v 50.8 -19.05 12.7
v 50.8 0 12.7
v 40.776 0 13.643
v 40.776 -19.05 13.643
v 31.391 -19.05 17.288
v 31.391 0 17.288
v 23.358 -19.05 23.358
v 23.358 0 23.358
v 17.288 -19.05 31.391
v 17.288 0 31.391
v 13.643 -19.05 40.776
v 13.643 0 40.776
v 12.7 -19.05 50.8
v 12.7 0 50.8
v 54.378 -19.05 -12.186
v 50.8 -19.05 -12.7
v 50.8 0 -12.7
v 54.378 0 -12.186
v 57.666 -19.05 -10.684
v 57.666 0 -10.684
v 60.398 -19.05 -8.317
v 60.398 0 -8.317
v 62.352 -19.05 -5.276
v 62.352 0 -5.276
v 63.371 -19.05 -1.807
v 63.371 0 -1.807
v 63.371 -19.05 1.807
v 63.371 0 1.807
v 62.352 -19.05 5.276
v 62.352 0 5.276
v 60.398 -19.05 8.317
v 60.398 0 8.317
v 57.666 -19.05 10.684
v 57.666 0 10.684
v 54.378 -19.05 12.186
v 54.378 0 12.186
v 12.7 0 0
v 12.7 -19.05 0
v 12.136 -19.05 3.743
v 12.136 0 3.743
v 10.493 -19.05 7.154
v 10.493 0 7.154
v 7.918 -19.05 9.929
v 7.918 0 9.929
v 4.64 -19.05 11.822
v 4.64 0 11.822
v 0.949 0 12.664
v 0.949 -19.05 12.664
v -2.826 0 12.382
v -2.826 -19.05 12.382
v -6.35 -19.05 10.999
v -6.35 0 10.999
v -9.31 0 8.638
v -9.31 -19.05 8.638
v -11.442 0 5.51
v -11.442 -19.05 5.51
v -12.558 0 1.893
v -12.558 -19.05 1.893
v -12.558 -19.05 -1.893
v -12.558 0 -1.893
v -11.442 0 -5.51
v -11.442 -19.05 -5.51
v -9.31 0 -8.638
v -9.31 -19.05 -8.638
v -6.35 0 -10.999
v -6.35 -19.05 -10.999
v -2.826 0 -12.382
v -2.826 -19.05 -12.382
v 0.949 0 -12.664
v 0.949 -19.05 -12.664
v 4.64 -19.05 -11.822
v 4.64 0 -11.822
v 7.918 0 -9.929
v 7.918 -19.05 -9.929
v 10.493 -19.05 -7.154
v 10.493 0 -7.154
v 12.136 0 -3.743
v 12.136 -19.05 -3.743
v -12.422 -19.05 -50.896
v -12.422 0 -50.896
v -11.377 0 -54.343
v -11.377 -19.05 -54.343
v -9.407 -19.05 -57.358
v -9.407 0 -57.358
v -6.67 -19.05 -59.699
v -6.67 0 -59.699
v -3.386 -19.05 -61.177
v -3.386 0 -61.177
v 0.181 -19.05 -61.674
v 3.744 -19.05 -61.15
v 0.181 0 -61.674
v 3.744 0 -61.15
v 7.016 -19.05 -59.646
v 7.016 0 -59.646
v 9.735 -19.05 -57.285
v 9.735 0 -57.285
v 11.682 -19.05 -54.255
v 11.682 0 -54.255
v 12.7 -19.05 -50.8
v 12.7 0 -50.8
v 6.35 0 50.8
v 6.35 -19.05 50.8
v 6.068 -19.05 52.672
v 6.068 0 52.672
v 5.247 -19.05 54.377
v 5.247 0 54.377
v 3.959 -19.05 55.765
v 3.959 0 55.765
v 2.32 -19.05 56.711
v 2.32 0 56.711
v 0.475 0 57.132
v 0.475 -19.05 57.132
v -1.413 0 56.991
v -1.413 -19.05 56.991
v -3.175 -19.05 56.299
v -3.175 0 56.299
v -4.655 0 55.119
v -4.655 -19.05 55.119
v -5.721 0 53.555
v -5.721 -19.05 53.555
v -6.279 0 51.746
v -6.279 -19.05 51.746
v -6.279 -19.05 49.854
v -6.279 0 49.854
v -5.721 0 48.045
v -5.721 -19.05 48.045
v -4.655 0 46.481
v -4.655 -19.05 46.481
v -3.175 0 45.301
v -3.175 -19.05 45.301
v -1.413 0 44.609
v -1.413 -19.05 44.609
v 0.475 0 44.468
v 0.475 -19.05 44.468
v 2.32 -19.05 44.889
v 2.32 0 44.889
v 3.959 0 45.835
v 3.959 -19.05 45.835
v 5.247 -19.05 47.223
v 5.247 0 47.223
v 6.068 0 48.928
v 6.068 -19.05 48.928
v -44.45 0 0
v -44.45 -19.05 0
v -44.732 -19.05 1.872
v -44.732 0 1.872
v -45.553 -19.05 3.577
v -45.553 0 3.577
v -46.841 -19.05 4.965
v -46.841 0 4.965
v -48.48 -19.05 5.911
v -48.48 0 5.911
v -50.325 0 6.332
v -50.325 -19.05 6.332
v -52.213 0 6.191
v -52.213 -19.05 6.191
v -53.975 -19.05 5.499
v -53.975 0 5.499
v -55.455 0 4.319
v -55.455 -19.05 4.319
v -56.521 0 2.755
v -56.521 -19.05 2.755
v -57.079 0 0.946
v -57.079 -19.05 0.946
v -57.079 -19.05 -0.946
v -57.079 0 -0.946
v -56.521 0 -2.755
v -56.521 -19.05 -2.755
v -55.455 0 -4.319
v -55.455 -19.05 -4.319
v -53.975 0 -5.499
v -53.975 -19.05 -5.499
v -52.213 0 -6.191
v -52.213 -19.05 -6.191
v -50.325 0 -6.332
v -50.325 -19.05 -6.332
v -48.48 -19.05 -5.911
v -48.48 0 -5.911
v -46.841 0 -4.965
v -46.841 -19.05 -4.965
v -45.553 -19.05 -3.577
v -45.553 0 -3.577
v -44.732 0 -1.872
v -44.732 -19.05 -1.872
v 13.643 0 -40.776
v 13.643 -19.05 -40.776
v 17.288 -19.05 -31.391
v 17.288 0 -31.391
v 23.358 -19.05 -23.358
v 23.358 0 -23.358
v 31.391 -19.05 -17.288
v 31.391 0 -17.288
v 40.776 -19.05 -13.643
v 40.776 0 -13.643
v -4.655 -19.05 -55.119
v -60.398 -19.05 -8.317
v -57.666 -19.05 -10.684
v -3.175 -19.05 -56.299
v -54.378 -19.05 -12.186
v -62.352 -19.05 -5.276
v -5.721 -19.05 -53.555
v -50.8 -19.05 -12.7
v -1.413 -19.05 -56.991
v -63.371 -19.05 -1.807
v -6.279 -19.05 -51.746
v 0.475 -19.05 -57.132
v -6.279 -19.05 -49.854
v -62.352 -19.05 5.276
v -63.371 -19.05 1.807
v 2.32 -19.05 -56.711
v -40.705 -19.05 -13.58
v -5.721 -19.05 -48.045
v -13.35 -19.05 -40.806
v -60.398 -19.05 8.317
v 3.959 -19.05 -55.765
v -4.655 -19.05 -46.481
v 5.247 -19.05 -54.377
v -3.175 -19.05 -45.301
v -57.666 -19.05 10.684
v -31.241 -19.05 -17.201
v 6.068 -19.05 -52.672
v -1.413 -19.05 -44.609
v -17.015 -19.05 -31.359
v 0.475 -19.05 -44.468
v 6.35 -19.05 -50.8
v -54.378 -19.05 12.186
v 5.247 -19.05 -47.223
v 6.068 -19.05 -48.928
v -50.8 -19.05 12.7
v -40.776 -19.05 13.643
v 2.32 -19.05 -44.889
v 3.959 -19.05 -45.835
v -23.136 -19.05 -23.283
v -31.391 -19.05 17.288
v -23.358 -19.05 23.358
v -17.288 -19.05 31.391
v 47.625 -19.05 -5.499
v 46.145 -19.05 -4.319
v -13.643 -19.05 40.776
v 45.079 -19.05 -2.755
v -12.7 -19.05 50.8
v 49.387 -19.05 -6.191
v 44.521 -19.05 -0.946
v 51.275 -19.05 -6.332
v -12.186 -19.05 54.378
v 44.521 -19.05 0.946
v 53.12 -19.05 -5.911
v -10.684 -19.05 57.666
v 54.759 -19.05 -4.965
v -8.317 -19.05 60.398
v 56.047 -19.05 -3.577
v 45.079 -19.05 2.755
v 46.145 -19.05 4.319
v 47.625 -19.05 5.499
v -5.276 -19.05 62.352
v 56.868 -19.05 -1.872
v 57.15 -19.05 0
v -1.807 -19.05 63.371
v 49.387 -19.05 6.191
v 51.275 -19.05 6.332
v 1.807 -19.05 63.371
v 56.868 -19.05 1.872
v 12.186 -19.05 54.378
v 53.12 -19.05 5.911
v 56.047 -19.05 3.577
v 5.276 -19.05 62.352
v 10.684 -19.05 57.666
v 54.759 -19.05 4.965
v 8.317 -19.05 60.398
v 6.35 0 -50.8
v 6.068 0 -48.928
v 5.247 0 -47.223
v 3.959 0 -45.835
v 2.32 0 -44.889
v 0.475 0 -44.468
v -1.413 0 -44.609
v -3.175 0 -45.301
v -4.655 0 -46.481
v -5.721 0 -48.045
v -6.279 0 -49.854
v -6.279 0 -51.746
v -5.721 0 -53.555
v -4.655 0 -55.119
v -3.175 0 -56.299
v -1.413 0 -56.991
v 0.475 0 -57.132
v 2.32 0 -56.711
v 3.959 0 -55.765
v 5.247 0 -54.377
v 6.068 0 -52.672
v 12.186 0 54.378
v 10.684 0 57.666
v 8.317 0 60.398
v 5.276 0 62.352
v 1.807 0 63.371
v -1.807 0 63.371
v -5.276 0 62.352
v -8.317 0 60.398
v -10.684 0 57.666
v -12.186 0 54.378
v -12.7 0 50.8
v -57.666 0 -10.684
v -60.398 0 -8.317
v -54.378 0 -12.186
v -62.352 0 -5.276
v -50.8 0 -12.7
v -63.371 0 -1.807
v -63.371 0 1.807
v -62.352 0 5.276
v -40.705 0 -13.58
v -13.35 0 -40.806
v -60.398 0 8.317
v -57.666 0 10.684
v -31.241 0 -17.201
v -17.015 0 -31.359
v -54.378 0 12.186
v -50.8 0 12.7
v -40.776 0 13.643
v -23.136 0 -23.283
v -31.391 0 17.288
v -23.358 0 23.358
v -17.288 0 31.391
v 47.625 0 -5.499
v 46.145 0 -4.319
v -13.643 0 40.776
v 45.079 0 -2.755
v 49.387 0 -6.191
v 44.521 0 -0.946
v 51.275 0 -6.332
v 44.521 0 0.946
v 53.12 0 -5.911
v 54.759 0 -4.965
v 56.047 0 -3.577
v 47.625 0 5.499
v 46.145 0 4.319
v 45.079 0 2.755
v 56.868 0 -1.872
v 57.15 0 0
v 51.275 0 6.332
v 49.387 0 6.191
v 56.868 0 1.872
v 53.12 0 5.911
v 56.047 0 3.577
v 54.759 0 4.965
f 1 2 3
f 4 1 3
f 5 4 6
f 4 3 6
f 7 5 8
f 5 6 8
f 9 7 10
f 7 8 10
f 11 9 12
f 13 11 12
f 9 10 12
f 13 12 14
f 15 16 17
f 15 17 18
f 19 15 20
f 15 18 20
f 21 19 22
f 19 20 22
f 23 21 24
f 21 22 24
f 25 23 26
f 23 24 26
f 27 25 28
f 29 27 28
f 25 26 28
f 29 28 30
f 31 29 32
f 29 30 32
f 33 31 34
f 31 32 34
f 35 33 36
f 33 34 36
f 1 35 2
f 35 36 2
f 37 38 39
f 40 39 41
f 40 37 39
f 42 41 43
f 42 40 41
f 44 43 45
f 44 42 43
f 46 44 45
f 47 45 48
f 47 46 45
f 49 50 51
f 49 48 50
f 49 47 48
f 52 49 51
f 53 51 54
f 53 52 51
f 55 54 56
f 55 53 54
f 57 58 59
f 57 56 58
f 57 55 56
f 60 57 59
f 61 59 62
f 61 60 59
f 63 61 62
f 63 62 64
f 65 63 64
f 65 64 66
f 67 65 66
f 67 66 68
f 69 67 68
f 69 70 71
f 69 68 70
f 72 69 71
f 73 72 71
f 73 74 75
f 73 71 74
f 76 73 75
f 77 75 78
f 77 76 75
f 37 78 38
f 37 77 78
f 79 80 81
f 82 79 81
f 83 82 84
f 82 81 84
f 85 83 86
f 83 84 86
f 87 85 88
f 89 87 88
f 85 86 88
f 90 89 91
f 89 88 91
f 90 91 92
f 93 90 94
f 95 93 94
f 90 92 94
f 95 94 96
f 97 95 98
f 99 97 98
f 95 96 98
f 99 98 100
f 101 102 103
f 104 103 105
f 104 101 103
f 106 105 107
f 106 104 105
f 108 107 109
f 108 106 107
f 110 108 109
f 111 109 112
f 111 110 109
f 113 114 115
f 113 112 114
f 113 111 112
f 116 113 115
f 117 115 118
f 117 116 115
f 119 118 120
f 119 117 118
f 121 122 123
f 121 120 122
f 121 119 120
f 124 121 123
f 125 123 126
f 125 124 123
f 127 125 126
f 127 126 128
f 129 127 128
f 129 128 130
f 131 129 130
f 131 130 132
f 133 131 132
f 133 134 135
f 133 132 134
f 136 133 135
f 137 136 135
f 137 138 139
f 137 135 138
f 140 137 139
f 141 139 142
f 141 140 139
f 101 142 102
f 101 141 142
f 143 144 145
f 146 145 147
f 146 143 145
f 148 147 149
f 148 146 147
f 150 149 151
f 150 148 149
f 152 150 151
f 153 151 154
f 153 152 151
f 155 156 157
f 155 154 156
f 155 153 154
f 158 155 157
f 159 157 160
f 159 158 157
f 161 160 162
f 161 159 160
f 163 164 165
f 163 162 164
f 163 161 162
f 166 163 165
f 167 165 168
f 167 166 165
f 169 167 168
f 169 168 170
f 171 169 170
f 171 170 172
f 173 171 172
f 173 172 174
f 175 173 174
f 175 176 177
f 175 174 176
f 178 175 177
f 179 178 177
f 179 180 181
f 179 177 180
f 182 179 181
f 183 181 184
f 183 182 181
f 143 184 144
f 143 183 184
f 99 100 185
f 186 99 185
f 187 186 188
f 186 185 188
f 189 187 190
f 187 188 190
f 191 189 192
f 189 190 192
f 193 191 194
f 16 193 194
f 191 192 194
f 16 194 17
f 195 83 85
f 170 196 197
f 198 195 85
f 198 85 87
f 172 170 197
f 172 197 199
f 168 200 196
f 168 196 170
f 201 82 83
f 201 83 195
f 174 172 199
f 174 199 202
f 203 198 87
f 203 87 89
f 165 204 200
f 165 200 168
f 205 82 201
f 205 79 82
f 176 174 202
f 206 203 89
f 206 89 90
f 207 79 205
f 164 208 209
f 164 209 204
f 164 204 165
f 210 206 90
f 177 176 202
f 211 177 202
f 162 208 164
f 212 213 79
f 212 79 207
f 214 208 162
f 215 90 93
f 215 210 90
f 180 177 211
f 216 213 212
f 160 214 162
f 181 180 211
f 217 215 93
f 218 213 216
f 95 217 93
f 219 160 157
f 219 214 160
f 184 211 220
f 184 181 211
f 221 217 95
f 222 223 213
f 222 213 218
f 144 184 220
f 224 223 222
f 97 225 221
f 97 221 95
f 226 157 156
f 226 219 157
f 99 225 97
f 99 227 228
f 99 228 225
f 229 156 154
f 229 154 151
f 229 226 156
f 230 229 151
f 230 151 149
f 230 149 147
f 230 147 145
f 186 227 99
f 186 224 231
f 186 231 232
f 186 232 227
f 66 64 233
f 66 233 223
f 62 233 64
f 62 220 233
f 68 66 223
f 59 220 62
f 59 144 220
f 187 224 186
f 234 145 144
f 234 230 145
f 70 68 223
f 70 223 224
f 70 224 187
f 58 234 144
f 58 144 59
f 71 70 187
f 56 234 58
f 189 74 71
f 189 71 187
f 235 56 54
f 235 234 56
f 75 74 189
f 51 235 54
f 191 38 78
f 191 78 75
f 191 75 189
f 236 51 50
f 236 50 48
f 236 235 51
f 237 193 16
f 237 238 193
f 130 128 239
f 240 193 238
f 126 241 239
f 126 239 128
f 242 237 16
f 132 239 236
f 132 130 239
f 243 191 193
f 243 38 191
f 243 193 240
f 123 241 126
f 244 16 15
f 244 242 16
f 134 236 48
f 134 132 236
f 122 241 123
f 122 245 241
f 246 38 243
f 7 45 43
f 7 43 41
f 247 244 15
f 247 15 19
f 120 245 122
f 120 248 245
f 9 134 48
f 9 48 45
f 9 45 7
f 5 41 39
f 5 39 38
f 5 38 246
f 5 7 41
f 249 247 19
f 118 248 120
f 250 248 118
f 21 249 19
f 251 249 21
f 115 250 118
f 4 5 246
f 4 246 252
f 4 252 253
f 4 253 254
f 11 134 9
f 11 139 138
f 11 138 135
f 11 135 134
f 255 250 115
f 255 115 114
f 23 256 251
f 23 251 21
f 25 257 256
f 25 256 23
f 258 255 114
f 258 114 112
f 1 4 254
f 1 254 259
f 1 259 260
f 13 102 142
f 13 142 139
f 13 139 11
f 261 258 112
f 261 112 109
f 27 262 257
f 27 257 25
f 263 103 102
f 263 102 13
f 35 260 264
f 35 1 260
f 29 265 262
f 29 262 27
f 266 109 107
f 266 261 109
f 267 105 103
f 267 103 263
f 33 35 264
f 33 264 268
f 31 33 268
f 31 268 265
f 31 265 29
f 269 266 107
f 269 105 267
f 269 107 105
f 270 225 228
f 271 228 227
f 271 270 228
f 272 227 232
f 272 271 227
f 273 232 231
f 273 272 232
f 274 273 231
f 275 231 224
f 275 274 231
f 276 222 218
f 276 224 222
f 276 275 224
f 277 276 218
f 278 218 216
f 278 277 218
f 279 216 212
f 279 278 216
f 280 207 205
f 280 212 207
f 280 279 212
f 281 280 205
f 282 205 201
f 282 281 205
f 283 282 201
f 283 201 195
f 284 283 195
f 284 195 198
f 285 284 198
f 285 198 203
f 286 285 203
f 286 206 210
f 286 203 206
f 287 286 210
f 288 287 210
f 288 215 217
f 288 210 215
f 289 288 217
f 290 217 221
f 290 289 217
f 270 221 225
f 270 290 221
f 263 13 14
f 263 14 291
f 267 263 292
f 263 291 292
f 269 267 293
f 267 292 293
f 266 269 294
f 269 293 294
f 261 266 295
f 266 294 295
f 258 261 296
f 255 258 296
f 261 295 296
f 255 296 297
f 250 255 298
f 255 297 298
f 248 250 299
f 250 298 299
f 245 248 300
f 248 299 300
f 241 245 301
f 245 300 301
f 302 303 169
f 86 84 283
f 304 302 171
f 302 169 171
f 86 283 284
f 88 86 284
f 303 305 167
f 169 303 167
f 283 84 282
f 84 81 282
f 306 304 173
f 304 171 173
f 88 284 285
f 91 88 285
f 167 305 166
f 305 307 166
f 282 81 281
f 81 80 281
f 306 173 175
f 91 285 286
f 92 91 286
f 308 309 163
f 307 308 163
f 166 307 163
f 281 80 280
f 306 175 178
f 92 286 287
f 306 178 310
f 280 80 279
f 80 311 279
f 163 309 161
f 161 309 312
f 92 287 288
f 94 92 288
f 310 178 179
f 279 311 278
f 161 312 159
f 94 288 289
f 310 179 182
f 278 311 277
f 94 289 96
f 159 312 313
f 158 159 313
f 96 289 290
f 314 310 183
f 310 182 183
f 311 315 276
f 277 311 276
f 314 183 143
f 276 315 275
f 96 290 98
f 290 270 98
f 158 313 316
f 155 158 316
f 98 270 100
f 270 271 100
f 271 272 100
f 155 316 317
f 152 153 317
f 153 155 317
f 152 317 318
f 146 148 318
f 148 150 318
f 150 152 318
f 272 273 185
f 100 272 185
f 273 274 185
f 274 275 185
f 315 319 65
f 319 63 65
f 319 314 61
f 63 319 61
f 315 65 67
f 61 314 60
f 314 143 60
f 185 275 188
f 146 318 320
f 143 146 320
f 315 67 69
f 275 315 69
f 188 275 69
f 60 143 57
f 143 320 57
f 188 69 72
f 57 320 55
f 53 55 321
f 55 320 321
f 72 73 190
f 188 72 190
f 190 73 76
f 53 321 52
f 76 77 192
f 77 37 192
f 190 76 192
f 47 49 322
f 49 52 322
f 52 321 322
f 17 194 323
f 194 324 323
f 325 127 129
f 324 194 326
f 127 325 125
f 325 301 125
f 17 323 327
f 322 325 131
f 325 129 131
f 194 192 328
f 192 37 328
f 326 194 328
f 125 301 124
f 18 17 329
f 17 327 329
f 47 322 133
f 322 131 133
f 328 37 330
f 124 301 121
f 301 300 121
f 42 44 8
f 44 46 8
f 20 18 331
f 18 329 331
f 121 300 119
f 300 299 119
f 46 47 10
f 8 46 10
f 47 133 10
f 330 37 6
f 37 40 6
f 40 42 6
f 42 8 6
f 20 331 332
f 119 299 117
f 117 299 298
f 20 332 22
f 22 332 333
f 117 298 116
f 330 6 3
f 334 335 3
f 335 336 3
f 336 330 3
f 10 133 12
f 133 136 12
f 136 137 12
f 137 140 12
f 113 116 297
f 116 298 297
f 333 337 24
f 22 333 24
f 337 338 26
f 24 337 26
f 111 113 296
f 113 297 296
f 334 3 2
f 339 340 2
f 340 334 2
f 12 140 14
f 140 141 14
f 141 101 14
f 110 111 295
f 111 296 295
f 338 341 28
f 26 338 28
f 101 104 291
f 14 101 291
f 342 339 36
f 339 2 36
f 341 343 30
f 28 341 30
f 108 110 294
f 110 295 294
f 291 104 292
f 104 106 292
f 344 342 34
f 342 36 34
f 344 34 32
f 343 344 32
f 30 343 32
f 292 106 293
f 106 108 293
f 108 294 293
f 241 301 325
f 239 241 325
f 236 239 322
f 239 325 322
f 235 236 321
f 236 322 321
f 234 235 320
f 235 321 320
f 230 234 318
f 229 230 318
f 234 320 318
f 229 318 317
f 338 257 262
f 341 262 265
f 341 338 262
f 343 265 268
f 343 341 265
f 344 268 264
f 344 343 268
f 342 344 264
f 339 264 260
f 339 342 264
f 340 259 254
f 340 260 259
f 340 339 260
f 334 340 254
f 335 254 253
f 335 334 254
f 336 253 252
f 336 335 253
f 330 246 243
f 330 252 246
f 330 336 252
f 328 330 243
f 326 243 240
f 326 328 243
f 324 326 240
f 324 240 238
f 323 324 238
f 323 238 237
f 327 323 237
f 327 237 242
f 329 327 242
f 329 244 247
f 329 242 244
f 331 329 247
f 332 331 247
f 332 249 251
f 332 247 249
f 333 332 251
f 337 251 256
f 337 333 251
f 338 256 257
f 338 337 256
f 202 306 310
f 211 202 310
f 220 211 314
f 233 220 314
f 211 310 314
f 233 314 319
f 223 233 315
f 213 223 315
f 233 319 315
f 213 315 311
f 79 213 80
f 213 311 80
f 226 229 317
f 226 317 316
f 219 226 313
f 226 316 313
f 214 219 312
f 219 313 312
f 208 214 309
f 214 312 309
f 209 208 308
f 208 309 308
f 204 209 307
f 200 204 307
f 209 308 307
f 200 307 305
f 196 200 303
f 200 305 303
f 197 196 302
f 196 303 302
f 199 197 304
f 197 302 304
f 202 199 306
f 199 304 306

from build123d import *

# Parameters (mm, degrees)
F1_DEPTH = 19.05
F2_R     = 6.35
F2_R_2   = 12.7
F3_DEPTH = 50.8


with BuildPart() as f1:
    # F0 (on Front) → F1 (new body)
    with BuildSketch(Plane.XZ):
        with BuildLine():
            ThreePointArc((-12.7, 50.8), (-23.358147, 23.358147), (-50.8, 12.7))
            ThreePointArc((-50.8, 12.7), (-63.5, 0), (-50.8, -12.7))
            ThreePointArc((-50.8, -12.7), (-23.136197, -23.283192), (-12.421733, -50.896417))
            ThreePointArc((-12.421733, -50.896417), (0.180683, -61.674015), (12.7, -50.8))
            ThreePointArc((12.7, -50.8), (23.358147, -23.358147), (50.8, -12.7))
            ThreePointArc((50.8, -12.7), (63.5, 0), (50.8, 12.7))
            ThreePointArc((50.8, 12.7), (23.358147, 23.358147), (12.7, 50.8))
            ThreePointArc((12.7, 50.8), (0, 63.5), (-12.7, 50.8))
        make_face()
    extrude(amount=F1_DEPTH)

    # F2 (on Front) → F3 (cut)
    with BuildSketch(Plane.XZ):
        with Locations((0, 50.8)):
            Circle(F2_R)
        with Locations((50.8, 0)):
            Circle(F2_R)
        with Locations((0, -50.8)):
            Circle(F2_R)
        with Locations((-50.8, 0)):
            Circle(F2_R)
        Circle(F2_R_2)
    extrude(amount=F3_DEPTH, mode=Mode.SUBTRACT)


solid = f1.part
